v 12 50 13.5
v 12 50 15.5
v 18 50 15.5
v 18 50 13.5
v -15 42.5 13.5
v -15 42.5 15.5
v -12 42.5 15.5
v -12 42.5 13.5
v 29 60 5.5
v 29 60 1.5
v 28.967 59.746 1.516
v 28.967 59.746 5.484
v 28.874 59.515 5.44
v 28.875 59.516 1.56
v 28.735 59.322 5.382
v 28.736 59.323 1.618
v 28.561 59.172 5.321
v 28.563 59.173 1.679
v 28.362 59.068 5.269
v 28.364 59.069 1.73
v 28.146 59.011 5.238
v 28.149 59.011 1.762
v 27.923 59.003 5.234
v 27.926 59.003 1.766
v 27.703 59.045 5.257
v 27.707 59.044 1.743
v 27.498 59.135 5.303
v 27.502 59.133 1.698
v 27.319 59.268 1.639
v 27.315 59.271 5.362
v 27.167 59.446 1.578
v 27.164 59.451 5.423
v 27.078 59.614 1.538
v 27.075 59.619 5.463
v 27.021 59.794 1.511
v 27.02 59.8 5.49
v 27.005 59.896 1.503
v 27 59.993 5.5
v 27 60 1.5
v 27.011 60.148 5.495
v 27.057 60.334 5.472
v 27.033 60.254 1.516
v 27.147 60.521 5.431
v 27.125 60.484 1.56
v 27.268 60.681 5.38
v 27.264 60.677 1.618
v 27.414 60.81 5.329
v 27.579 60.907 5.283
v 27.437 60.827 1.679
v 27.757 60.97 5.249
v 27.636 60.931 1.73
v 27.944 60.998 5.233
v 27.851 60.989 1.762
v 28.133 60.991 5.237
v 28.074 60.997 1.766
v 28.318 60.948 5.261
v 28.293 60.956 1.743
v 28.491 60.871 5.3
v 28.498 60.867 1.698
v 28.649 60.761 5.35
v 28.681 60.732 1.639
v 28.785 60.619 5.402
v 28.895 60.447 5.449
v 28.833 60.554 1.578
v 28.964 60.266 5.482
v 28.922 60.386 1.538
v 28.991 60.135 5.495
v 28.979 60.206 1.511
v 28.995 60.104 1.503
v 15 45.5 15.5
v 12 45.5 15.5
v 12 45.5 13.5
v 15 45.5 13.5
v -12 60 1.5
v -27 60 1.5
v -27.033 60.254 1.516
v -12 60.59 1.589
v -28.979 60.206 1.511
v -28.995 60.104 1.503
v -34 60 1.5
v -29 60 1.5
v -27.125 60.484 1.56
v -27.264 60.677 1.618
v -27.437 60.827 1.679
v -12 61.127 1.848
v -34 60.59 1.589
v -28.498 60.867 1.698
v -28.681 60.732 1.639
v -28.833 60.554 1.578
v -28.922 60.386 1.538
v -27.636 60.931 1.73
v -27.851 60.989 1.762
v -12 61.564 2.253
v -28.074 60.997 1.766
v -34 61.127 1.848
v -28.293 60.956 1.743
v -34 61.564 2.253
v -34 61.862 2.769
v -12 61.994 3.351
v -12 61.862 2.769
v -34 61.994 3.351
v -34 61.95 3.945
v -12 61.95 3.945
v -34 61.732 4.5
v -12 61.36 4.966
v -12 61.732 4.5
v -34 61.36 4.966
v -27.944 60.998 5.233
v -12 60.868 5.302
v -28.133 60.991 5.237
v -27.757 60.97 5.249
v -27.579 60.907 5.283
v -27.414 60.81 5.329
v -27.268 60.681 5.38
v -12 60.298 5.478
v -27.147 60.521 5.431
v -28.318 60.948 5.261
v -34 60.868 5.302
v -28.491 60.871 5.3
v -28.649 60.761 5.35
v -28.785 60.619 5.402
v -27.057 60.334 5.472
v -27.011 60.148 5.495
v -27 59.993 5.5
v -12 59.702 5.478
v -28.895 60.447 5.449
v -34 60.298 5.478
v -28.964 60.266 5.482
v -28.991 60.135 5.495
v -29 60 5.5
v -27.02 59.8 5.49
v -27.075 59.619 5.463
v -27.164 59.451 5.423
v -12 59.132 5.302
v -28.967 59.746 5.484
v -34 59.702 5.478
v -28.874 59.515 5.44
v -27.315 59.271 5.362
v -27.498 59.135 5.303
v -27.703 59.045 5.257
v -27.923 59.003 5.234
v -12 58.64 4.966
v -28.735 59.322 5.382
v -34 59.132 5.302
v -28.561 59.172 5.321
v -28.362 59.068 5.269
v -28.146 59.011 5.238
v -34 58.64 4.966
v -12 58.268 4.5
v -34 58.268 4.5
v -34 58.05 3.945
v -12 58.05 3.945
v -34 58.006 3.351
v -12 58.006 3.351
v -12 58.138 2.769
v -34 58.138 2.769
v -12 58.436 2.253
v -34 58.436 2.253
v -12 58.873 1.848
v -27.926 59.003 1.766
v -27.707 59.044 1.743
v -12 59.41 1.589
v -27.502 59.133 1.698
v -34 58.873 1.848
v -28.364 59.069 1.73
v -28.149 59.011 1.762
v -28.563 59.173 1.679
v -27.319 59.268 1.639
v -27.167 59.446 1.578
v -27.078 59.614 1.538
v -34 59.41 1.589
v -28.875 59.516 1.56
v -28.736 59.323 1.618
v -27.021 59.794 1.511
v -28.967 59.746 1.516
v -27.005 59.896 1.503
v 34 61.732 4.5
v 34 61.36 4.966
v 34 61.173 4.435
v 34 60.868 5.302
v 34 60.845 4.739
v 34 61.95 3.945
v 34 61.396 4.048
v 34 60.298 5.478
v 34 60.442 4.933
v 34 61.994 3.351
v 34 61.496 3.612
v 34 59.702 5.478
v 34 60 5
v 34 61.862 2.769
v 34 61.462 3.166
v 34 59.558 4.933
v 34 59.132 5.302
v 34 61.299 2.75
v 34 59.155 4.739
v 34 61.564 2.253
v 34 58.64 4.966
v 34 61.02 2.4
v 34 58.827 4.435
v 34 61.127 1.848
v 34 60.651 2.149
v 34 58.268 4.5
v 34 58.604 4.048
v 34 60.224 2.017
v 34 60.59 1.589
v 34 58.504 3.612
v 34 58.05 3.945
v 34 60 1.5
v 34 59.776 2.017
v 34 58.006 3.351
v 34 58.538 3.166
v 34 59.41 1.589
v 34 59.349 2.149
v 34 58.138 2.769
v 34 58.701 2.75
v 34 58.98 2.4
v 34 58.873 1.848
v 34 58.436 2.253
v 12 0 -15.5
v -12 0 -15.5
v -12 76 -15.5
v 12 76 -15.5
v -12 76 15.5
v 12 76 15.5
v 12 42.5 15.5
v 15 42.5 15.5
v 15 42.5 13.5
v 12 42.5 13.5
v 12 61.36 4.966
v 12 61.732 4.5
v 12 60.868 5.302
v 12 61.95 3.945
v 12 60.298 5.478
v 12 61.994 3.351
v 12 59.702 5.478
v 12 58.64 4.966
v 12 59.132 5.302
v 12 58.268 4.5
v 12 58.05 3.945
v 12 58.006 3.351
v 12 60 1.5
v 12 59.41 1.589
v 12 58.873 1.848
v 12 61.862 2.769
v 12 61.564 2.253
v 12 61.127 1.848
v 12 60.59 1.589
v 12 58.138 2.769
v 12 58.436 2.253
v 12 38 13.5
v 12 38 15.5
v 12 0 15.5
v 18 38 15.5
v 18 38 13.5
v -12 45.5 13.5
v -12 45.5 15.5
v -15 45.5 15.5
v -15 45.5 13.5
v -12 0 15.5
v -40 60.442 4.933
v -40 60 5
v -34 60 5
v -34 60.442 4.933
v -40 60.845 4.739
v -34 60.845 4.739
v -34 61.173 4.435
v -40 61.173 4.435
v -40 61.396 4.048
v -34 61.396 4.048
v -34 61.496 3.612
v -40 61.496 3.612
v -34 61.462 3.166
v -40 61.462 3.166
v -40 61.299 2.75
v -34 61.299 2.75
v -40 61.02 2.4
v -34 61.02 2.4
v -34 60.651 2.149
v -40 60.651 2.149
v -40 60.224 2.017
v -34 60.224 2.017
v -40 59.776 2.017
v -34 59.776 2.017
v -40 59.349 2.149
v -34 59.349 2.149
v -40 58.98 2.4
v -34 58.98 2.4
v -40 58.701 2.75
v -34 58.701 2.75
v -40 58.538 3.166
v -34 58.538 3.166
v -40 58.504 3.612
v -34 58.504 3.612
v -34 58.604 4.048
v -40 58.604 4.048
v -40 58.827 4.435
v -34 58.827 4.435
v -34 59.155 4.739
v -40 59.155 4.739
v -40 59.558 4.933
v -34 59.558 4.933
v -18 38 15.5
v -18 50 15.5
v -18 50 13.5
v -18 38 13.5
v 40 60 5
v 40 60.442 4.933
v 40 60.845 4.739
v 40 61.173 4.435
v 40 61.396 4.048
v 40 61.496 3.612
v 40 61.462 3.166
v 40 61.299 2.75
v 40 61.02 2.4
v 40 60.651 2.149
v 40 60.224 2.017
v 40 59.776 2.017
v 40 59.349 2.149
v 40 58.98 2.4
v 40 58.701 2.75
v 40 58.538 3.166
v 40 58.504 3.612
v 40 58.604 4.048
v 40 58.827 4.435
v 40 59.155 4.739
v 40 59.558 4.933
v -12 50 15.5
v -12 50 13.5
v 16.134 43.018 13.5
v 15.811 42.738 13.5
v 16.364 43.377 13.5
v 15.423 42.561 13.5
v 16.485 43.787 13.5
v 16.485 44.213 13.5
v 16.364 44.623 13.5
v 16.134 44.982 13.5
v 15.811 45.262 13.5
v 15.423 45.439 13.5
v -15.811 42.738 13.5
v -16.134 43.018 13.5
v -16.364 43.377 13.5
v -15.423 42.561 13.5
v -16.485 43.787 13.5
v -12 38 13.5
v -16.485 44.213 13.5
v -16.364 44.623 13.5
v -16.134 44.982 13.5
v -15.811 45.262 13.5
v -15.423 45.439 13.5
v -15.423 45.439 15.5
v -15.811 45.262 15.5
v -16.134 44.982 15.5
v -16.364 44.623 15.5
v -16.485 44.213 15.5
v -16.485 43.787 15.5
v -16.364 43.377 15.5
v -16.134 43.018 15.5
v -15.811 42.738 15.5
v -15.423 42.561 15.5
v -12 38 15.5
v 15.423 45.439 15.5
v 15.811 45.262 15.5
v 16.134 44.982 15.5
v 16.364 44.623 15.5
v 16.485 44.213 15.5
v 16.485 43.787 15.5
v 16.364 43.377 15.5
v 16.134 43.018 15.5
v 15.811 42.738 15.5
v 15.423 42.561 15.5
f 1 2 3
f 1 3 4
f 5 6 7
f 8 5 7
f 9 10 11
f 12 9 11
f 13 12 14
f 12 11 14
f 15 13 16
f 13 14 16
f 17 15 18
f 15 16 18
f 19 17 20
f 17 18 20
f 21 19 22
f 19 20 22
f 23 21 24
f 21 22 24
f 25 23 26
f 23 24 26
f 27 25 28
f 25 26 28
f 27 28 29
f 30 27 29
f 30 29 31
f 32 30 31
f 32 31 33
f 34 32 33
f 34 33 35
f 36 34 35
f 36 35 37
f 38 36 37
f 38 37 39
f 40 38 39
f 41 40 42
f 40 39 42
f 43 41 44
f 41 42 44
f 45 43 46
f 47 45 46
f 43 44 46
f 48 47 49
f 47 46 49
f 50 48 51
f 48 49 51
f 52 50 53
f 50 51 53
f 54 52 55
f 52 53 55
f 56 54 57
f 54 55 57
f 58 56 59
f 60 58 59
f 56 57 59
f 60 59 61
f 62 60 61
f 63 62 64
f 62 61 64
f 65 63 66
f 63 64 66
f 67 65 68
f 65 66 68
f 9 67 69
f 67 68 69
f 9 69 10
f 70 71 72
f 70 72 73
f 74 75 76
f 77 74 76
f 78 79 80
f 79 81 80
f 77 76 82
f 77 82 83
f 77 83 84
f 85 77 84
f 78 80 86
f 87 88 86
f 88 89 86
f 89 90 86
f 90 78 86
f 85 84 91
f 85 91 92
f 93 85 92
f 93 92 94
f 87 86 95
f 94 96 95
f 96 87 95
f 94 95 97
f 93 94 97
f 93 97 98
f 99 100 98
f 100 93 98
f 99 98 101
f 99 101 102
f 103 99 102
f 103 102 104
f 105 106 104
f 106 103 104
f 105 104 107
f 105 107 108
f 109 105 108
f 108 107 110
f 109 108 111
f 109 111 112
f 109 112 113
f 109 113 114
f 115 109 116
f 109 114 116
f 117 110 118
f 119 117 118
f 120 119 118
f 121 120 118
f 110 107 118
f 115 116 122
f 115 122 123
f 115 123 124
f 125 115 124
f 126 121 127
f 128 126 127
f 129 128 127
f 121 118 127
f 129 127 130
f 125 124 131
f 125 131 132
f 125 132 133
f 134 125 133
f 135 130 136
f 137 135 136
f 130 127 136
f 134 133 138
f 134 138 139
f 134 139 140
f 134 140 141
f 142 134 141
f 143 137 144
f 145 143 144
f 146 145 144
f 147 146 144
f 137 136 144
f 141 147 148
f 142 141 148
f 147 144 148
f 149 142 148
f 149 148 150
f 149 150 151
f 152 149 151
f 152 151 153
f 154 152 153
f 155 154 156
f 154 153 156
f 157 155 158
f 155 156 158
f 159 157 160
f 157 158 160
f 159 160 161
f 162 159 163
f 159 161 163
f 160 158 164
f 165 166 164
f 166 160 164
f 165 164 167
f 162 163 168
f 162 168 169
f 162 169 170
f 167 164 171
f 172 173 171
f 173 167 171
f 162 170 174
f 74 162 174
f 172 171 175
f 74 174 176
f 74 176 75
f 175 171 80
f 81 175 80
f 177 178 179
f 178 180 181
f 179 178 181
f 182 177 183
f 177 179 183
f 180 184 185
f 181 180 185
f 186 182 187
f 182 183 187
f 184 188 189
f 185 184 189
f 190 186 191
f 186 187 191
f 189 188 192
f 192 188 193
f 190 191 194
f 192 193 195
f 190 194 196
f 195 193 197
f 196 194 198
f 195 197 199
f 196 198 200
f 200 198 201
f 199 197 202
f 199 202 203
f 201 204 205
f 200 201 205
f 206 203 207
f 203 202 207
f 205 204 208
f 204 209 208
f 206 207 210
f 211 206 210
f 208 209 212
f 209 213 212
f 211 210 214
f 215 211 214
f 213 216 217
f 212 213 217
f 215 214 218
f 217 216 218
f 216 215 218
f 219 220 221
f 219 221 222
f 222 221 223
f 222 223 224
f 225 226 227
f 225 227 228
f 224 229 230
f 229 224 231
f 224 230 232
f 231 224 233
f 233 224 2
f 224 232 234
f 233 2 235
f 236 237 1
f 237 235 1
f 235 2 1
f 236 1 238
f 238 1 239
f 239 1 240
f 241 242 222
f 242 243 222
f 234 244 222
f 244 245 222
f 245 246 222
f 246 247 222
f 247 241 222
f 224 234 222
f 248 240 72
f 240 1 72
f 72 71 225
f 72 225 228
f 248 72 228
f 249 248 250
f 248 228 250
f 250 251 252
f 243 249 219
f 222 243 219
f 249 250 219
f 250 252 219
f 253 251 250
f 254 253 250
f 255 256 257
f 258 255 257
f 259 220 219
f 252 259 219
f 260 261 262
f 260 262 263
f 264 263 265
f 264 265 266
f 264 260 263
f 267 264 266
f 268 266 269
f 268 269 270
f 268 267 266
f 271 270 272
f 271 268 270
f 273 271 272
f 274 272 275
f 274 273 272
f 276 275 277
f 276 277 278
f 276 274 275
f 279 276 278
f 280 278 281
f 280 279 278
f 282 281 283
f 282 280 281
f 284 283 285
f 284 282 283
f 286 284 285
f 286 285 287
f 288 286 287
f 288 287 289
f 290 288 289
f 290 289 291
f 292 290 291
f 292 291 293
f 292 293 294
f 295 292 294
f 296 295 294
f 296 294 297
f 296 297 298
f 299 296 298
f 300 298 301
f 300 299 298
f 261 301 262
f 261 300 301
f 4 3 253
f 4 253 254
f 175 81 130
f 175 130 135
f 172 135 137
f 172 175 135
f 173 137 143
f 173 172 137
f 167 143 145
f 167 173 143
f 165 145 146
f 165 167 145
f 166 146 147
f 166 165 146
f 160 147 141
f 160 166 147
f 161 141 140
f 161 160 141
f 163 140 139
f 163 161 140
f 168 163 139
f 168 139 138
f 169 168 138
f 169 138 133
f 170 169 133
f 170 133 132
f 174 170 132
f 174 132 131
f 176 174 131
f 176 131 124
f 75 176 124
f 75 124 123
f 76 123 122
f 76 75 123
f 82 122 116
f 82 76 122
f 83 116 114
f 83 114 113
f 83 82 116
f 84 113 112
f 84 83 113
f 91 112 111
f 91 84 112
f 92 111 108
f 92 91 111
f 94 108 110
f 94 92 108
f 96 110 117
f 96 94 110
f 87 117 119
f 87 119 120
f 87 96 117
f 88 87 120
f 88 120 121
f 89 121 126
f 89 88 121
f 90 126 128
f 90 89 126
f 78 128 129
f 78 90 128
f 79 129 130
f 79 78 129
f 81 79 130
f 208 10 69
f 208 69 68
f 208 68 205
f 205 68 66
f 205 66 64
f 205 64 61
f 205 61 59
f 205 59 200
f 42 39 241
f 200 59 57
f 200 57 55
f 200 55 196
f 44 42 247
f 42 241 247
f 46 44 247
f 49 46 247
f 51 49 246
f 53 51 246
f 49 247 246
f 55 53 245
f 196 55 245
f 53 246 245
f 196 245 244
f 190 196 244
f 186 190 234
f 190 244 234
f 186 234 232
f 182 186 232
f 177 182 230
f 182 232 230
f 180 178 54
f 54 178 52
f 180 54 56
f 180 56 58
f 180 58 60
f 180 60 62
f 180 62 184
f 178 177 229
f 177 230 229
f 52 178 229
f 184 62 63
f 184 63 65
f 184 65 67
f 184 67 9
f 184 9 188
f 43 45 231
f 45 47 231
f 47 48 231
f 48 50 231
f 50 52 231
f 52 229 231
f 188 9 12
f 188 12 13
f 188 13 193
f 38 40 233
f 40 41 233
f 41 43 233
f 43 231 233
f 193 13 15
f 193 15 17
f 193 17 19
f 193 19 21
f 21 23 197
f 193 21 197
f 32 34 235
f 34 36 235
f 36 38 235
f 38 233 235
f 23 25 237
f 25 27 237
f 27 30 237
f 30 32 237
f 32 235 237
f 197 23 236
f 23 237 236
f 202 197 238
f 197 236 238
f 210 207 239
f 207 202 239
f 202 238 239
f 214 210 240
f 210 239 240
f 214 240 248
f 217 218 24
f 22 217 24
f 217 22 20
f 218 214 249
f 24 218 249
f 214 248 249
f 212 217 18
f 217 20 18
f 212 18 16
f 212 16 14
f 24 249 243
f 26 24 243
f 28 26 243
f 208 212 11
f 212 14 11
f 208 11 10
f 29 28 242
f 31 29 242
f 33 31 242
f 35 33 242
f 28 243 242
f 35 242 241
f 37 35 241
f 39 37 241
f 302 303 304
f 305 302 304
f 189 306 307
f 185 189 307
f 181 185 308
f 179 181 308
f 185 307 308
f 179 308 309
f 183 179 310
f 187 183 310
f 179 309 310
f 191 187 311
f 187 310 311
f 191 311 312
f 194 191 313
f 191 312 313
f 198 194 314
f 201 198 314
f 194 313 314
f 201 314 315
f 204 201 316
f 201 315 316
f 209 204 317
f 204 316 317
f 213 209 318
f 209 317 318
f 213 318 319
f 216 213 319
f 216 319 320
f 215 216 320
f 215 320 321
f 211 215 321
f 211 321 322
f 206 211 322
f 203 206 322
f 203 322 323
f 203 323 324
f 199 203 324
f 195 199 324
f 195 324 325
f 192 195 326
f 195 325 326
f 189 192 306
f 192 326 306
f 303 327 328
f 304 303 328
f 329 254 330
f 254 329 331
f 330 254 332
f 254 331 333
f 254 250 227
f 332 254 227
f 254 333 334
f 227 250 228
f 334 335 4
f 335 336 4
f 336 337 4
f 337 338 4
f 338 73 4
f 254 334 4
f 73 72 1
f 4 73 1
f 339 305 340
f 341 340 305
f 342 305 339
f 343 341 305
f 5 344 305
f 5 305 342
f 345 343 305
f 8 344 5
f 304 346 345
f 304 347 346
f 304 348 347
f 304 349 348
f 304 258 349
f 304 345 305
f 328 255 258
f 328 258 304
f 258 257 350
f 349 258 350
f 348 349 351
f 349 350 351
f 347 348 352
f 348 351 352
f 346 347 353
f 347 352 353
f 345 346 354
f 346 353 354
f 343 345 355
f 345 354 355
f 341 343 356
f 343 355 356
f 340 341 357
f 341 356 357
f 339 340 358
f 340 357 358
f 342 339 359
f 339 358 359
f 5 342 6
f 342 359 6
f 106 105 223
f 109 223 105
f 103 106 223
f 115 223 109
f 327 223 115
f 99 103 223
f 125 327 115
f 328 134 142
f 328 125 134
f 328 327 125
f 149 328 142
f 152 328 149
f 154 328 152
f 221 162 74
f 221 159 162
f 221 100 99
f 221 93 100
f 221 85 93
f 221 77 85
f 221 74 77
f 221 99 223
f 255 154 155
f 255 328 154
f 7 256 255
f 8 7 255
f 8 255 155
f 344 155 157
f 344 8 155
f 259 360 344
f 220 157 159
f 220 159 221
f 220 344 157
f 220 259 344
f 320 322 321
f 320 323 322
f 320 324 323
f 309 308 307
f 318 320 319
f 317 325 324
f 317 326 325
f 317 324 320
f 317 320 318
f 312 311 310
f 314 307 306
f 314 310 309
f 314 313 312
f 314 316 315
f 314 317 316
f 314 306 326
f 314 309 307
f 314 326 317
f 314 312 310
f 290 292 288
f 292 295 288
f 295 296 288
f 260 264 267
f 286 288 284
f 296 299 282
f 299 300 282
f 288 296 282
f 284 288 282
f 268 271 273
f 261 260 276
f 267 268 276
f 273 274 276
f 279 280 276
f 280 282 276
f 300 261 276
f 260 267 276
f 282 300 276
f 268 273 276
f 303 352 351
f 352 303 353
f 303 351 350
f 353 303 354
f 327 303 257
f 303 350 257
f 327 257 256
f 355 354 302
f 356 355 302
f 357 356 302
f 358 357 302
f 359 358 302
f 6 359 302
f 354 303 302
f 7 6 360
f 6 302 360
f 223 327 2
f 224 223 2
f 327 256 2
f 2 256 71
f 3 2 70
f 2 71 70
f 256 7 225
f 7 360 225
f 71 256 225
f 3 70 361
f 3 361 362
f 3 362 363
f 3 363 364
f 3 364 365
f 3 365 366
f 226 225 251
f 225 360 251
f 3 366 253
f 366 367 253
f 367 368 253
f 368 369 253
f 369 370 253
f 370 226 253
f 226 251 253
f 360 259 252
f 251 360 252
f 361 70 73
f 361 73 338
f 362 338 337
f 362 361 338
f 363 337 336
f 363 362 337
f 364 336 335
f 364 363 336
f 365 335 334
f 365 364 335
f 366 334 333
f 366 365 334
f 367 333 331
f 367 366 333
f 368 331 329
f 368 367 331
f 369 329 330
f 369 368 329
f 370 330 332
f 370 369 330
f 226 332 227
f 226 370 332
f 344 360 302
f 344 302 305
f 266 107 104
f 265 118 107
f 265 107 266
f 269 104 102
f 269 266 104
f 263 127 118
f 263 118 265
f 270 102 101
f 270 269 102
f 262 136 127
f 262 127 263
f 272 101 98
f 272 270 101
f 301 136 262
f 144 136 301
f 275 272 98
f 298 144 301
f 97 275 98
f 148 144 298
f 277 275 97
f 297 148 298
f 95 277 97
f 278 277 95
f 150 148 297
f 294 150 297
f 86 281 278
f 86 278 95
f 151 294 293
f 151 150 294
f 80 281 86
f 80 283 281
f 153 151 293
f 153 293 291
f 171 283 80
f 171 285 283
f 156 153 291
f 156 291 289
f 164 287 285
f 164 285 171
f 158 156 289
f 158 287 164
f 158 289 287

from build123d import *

# Parameters (mm, degrees)
SKETCH1_W                = 24
SKETCH1_H                = 31
BOSS_EXTRUDE1_DEPTH      = 76
BOSS_EXTRUDE2_DEPTH      = 28
BOSS_EXTRUDE2_DEPTH_BACK = 52
SKETCH2_R                = 2
SKETCH7_R                = 2
SKETCH7_R_2              = 1.5
CUT_EXTRUDE1_DEPTH       = 6
SKETCH17_R               = 1
CUT_EXTRUDE3_DEPTH       = 88.271129247
SKETCH18_W               = 2
SKETCH18_H               = 12
BOSS_EXTRUDE3_DEPTH      = 6
CUT_EXTRUDE4_REACH       = 93.307


with BuildPart() as part:
    # Sketch1 → Boss-Extrude1 (new body)
    with BuildSketch(Plane(origin=(0, 0, 0), x_dir=(1, 0, 0), z_dir=(0, 1, 0))):
        Rectangle(SKETCH1_W, SKETCH1_H)
    extrude(amount=BOSS_EXTRUDE1_DEPTH)

    # Sketch2 → Boss-Extrude2 (add, two sides: drawn at the far end of the back side and taken through both)
    with BuildSketch(Plane(origin=(12, 0, 0), x_dir=(0, 0, -1), z_dir=(1, 0, 0)).offset(-BOSS_EXTRUDE2_DEPTH_BACK)):
        with Locations((-3.5, 60)):
            Circle(SKETCH2_R)
    extrude(amount=BOSS_EXTRUDE2_DEPTH + BOSS_EXTRUDE2_DEPTH_BACK)

    # Sketch7 → Cut-Extrude1 (cut)
    with BuildSketch(Plane.ZY.offset(40)):
        with Locations(Location((3.5, 60, 0), (0, 0, 180))):
            Circle(SKETCH7_R)
        with Locations((3.5, 60)):
            Circle(SKETCH7_R_2, mode=Mode.SUBTRACT)
    cut_extrude1 = extrude(amount=-CUT_EXTRUDE1_DEPTH, mode=Mode.SUBTRACT)

    # Sketch17 → Cut-Extrude3 (cut, through all)
    with BuildSketch(Plane.XY):
        with Locations(Location((-28, 60, 0), (0, 0, 180))):
            Circle(SKETCH17_R)
    cut_extrude3 = extrude(amount=CUT_EXTRUDE3_DEPTH, mode=Mode.SUBTRACT)

    # Mirror7: Cut-Extrude1 across plane
    add(cut_extrude1.mirror(Plane(origin=(0, 0, 0), x_dir=(0, 0, 1), z_dir=(1, 0, 0))), mode=Mode.SUBTRACT)

    # Sketch18 → Boss-Extrude3 (add)
    with BuildSketch(Plane(origin=(12, 0, 0), x_dir=(0, 0, -1), z_dir=(1, 0, 0))):
        with Locations((-14.5, 44)):
            Rectangle(SKETCH18_W, SKETCH18_H)
    boss_extrude3 = extrude(amount=BOSS_EXTRUDE3_DEPTH)

    # Sketch19 → Cut-Extrude4 (cut, up to next)
    with BuildSketch(Plane.XY.offset(15.5), mode=Mode.PRIVATE) as cut_extrude4_sk1:
        with BuildLine():
            Line((12, 45.5), (15, 45.5))
            ThreePointArc((15, 45.5), (16.5, 44), (15, 42.5))
            Line((15, 42.5), (12, 42.5))
            Line((12, 42.5), (12, 45.5))
        make_face()
    cut_extrude4_tool1 = extrude(cut_extrude4_sk1.sketch, amount=-CUT_EXTRUDE4_REACH, mode=Mode.PRIVATE) & part.part
    cut_extrude4 = cut_extrude4_tool1.solids().sort_by_distance((14.102462, 44, 15.5))[0]
    add(cut_extrude4, mode=Mode.SUBTRACT)

    # Mirror8: Boss-Extrude3, Cut-Extrude4 across plane
    add(boss_extrude3.mirror(Plane(origin=(0, 0, 0), x_dir=(0, 0, 1), z_dir=(1, 0, 0))))
    add(cut_extrude4.mirror(Plane(origin=(0, 0, 0), x_dir=(0, 0, 1), z_dir=(1, 0, 0))), mode=Mode.SUBTRACT)

    # Mirror9: Cut-Extrude3 across plane
    add(cut_extrude3.mirror(Plane(origin=(0, 0, 0), x_dir=(0, 0, 1), z_dir=(1, 0, 0))), mode=Mode.SUBTRACT)


solid = part.part
